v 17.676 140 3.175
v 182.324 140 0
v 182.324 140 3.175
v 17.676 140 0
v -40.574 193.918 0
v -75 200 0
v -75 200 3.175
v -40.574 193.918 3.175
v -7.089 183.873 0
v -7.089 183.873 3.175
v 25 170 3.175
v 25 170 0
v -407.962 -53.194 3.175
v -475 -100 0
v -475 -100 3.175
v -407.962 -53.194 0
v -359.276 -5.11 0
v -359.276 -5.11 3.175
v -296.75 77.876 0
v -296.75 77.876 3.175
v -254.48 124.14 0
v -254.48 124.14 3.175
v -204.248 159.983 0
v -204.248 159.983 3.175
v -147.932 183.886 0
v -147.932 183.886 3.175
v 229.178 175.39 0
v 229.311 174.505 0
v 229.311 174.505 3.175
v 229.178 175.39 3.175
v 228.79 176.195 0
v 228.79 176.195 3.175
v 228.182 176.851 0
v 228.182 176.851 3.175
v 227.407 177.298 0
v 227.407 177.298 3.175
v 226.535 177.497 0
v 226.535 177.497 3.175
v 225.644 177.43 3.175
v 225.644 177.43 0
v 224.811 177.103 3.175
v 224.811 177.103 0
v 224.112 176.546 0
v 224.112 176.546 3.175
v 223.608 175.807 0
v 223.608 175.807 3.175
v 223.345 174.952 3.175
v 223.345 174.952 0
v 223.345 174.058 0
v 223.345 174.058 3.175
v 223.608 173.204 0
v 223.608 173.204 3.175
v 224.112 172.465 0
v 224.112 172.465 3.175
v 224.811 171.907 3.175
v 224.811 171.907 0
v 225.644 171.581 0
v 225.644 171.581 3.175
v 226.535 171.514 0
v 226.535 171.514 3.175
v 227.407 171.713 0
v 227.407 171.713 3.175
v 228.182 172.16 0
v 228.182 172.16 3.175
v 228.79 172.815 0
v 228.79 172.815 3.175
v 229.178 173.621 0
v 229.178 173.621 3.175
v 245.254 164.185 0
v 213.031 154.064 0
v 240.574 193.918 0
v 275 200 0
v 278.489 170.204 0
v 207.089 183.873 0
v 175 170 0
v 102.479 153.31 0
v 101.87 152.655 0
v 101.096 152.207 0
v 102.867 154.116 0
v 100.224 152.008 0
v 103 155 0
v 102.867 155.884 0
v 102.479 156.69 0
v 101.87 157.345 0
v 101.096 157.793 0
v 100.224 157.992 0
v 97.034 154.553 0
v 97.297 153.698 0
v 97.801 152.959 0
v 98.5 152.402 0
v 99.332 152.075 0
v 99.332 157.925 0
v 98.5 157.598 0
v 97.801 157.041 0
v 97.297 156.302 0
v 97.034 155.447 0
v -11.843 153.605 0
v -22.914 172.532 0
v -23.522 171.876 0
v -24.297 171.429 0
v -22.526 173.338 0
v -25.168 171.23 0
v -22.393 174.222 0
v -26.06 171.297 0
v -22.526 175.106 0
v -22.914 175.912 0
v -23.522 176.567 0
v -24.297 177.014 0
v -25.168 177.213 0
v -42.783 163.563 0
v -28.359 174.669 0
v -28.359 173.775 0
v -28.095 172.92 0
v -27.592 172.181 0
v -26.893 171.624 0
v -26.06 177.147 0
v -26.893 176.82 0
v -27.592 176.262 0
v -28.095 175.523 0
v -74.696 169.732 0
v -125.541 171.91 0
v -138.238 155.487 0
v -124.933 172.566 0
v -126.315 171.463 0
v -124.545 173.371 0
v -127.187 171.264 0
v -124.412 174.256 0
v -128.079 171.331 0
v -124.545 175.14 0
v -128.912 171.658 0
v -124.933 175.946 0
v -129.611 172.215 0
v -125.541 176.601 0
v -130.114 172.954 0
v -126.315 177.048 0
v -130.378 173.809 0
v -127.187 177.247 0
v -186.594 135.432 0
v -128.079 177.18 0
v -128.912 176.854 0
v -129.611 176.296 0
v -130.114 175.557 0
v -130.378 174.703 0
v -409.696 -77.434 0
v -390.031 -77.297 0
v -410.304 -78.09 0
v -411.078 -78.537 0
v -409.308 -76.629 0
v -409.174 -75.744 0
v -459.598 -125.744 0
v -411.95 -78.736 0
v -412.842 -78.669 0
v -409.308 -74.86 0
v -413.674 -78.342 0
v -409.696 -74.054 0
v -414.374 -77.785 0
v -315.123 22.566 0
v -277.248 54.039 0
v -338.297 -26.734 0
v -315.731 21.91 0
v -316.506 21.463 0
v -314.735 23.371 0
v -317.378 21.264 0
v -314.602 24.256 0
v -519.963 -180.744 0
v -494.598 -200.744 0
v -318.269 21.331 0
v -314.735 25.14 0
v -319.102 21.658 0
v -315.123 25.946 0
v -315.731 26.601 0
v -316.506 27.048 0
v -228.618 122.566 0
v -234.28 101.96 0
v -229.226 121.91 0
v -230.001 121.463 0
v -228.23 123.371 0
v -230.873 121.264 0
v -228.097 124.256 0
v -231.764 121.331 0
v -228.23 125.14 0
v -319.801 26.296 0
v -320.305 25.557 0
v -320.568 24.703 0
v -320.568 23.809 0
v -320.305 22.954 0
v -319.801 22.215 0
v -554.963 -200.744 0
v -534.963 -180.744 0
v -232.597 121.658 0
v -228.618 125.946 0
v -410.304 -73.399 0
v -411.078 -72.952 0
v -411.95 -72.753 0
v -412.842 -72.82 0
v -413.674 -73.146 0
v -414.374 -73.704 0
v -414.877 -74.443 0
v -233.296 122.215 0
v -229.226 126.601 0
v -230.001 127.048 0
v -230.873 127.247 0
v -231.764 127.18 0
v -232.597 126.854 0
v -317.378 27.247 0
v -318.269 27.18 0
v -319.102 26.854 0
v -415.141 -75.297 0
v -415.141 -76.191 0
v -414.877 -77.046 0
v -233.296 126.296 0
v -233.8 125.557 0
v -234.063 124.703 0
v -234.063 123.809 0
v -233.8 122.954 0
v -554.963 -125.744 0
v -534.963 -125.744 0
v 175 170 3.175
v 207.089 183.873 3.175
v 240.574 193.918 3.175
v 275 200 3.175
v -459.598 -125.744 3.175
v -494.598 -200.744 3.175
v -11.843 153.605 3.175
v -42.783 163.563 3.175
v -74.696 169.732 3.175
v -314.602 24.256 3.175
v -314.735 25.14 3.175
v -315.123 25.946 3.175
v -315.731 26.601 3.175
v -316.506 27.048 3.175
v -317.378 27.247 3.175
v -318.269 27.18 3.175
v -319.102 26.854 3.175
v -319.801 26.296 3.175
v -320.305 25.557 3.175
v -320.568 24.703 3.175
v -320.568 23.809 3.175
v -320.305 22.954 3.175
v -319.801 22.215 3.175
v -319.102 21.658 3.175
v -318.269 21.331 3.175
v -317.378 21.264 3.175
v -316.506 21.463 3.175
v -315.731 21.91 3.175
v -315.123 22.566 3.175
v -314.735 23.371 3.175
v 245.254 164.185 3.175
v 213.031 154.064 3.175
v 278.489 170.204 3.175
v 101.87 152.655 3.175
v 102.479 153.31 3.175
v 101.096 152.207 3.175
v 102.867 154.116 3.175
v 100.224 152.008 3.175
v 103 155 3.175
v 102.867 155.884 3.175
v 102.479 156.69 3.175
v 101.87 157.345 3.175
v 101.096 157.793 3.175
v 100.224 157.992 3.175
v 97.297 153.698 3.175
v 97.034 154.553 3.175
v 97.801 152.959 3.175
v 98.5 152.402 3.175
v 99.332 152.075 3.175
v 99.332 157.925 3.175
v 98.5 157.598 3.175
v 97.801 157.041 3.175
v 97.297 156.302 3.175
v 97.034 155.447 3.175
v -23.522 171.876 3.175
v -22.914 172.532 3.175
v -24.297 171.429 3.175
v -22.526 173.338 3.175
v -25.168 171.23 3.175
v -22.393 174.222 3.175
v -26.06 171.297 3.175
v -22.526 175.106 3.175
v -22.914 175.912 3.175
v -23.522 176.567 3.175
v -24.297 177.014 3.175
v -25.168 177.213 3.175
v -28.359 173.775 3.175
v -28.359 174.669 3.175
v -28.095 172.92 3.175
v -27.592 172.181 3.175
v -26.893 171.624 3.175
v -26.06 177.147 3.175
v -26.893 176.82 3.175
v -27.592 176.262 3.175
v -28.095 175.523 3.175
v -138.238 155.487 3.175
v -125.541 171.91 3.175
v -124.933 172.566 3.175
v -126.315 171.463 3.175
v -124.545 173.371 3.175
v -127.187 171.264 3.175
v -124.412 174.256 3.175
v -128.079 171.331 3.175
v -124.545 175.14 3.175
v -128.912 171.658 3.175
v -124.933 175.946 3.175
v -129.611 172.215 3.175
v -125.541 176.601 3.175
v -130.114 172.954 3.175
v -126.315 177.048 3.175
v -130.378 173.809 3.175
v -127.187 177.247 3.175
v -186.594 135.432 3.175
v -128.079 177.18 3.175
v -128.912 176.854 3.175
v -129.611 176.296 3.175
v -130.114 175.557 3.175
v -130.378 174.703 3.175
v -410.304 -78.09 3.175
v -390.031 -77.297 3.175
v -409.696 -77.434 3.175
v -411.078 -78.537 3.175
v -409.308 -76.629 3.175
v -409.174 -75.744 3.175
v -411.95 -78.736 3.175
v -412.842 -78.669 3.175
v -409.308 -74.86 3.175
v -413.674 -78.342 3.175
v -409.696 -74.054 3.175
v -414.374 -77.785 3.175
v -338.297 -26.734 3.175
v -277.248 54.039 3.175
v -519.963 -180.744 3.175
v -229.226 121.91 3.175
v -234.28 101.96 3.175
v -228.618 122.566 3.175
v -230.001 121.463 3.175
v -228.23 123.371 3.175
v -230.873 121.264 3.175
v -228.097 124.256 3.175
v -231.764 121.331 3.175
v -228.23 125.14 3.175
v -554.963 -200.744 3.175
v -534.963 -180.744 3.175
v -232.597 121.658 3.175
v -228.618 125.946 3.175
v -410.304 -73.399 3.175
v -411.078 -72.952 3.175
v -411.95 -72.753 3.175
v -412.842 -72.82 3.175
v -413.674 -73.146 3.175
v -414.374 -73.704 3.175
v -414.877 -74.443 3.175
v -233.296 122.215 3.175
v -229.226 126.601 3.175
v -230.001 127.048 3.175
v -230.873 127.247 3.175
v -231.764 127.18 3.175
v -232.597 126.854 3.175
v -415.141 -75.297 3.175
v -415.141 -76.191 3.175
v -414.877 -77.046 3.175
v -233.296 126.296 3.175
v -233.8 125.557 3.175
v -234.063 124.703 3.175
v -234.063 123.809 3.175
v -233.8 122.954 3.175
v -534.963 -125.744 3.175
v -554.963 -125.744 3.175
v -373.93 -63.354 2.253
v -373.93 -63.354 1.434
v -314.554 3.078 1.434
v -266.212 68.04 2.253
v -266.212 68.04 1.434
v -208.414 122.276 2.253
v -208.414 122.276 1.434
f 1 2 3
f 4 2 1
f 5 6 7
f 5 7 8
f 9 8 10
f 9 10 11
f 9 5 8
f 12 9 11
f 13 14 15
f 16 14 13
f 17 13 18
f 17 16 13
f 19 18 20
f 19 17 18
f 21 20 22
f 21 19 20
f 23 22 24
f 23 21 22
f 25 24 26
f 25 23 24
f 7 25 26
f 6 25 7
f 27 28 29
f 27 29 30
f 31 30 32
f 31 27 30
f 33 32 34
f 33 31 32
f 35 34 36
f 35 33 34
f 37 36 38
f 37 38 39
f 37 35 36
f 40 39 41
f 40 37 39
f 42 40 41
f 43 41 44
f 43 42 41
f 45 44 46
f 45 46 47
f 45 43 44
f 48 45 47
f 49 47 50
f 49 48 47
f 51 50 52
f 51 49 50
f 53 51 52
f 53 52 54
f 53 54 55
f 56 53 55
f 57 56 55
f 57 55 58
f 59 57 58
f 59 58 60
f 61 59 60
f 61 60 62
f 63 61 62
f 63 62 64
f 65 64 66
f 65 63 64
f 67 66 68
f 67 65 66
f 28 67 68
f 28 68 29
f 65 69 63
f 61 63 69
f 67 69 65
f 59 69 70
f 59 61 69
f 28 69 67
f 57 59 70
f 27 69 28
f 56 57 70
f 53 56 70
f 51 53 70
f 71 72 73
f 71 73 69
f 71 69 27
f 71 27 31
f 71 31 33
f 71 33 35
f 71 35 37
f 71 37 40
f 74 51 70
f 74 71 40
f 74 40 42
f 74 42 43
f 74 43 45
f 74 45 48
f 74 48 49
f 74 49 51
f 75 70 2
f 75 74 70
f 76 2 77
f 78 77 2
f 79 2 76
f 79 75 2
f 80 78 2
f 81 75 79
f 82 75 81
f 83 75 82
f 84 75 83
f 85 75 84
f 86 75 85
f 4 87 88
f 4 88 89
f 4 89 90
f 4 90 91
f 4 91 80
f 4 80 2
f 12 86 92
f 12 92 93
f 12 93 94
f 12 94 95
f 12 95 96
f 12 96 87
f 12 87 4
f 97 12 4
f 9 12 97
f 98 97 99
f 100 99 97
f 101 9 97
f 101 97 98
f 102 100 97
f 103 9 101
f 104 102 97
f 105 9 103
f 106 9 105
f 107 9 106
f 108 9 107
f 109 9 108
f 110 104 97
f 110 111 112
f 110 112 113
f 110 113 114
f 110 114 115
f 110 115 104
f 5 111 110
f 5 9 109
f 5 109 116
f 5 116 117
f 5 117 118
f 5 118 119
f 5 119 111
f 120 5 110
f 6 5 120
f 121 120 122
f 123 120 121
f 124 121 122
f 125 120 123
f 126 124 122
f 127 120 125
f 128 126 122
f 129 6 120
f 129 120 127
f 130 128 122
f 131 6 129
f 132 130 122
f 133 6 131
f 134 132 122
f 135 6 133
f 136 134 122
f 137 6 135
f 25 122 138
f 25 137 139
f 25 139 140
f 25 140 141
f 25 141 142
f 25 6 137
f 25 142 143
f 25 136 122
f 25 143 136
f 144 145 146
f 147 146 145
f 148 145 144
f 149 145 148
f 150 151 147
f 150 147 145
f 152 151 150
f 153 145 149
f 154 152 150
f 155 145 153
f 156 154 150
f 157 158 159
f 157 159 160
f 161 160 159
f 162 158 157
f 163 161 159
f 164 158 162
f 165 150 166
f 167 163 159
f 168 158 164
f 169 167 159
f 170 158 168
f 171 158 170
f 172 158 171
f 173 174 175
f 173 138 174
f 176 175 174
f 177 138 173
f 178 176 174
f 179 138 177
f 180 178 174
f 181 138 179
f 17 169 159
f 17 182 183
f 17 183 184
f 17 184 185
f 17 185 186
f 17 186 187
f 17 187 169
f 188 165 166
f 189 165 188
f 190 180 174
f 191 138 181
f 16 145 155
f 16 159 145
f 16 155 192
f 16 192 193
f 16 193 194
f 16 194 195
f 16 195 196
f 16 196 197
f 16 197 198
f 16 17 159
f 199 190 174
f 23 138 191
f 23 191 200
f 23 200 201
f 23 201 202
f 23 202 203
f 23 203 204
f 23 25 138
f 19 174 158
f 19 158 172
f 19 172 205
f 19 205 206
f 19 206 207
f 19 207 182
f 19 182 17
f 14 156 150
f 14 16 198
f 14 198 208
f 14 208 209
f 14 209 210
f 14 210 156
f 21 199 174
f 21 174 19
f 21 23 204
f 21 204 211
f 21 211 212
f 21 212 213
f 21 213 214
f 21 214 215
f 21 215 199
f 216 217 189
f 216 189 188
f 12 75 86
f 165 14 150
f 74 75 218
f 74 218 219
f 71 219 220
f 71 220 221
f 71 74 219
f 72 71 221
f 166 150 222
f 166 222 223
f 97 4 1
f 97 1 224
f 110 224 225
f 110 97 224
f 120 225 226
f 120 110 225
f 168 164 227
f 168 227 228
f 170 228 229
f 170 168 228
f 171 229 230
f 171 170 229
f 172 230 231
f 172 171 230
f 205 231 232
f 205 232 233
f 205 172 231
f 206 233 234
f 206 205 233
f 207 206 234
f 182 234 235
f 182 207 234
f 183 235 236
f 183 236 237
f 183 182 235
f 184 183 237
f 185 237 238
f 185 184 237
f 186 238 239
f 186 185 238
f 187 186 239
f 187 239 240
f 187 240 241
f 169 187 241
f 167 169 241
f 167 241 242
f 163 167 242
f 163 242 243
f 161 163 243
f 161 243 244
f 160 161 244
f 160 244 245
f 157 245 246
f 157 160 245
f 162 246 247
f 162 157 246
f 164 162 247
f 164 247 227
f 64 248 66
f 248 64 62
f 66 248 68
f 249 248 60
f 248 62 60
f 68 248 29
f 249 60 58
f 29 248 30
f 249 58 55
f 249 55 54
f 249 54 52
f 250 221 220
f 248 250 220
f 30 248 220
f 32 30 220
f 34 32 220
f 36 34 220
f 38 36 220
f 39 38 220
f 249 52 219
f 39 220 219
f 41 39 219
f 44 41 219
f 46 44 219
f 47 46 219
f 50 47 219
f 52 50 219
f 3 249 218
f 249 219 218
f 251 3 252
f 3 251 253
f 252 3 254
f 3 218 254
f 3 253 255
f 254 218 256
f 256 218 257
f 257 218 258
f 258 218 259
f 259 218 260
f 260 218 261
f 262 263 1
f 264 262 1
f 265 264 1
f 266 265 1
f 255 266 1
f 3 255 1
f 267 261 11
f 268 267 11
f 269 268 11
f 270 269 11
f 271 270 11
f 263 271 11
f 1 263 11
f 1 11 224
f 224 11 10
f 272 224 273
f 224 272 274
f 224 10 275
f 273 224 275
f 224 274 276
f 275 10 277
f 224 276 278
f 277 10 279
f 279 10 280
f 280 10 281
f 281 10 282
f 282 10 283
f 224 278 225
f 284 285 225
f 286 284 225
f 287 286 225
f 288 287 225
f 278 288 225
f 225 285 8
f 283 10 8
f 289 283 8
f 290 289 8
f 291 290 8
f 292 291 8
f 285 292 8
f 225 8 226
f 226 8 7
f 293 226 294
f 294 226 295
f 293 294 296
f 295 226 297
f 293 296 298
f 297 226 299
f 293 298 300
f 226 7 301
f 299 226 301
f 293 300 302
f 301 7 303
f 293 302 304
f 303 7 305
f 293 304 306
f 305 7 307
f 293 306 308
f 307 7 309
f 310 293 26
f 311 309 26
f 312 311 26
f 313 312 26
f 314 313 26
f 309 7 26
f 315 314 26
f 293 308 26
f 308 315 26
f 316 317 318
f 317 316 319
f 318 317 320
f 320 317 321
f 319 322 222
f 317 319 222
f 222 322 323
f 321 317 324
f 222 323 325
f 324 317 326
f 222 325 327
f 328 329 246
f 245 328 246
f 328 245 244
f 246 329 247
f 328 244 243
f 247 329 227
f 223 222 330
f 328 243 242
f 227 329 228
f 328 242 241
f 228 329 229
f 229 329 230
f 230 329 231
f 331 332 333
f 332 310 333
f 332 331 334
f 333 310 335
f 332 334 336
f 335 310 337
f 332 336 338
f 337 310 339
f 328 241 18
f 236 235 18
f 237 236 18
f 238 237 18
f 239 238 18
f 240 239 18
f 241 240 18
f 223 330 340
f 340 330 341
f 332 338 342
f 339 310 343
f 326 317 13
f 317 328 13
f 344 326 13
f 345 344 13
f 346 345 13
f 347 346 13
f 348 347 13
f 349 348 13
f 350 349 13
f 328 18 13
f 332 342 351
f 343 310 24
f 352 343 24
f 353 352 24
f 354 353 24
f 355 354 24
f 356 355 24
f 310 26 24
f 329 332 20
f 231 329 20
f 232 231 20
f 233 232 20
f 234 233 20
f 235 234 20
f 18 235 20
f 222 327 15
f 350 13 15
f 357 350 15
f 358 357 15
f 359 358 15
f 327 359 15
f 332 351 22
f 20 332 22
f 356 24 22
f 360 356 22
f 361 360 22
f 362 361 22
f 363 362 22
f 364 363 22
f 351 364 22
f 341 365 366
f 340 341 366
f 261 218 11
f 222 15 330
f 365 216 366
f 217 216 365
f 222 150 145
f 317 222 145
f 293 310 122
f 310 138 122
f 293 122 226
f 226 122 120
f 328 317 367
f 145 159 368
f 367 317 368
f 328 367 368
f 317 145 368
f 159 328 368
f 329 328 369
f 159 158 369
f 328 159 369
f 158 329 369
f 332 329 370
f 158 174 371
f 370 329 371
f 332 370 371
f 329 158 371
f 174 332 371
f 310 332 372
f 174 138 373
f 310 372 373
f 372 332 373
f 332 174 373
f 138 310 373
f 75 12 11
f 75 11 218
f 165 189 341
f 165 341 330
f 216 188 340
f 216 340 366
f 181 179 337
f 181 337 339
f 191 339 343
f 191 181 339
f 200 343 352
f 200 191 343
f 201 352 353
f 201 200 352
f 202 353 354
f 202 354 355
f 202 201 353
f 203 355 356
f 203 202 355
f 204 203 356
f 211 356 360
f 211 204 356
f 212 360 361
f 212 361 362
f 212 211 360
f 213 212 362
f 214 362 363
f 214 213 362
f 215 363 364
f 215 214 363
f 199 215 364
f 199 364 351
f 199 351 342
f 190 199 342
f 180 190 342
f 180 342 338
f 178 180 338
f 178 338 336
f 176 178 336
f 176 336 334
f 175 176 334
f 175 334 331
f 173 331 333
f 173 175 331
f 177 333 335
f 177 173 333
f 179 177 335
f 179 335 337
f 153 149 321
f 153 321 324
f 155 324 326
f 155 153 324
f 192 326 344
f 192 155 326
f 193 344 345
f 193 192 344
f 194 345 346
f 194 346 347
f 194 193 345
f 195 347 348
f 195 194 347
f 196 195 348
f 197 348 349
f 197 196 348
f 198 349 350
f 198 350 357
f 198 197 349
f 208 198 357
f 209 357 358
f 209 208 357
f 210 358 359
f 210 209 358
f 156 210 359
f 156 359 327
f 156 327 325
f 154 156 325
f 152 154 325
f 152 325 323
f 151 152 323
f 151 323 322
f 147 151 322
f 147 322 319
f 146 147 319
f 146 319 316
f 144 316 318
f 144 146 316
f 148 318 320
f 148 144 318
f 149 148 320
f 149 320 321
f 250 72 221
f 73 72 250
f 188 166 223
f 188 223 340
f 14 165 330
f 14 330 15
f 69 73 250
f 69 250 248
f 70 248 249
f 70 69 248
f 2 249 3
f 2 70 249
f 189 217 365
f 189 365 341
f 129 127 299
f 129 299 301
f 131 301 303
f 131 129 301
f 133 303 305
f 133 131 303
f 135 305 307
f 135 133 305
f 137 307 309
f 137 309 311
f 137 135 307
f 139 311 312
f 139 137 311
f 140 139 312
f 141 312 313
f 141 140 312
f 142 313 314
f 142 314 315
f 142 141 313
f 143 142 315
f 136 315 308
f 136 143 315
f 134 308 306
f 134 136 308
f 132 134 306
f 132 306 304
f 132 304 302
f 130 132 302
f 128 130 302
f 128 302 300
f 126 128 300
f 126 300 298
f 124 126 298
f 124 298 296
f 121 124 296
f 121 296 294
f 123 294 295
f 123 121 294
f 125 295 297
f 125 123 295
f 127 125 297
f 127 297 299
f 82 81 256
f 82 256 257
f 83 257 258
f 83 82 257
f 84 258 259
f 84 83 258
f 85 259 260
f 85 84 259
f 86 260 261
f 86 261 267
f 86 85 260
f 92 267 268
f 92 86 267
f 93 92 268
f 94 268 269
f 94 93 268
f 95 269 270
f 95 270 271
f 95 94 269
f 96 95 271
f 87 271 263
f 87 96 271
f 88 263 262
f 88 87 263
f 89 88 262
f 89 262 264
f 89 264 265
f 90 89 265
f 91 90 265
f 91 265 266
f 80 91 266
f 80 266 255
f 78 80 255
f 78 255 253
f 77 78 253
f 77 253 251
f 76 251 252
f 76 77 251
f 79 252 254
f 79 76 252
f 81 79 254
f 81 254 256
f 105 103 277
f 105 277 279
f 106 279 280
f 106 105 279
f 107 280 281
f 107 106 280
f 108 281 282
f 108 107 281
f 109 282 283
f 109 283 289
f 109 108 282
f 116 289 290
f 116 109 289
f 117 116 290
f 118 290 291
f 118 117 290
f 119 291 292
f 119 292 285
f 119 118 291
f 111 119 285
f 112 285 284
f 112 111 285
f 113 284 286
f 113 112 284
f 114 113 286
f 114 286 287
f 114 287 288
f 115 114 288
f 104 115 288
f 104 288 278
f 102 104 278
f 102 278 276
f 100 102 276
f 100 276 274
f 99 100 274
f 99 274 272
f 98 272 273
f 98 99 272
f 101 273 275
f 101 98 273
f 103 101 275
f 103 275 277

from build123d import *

# Parameters (mm, degrees)
SKETCH1_R           = 3
BOSS_EXTRUDE1_DEPTH = 3.175


with BuildPart() as part:
    # Sketch1 → Boss-Extrude1 (new body)
    with BuildSketch(Plane.XY):
        with BuildLine():
            Line((25, 170), (175, 170))
            ThreePointArc((175, 170), (223.684930832, 189.383563894), (275, 200))
            Line((275, 200), (278.48892965, 170.203567833))
            ThreePointArc((278.48892965, 170.203567833), (228.984362684, 159.629140364), (182.323699215, 140))
            Line((182.323699215, 140), (17.676300785, 140))
            ThreePointArc((17.676300785, 140), (-27.163176857, 159.050053662), (-74.696057289, 169.732215313))
            add(Edge.make_bspline(
                [(-459.597813184, -125.74437106), (-458.167847661, -124.888859924), (-455.300989911, -123.160410804), (-449.693031194, -119.725805066), (-442.844497858, -115.430194443), (-434.897527213, -110.280573748), (-424.643042919, -103.410605598), (-412.446207366, -94.807407336), (-398.73286692, -84.425459971), (-385.875530014, -73.956655832), (-369.787206696, -59.850046206), (-355.152571956, -45.476802835), (-341.718077927, -30.784744771), (-332.160906415, -19.581186548), (-323.101555816, -8.241034683), (-311.630816912, 6.863649777), (-298.117522758, 25.605990916), (-282.395742384, 47.431562205), (-266.384320483, 68.25099024), (-249.34123977, 87.803395961), (-230.504956306, 105.928130356), (-212.601243201, 119.774018212), (-196.457396921, 130.048920131), (-183.303935629, 137.33205425), (-168.969219752, 144.162376514), (-153.317967868, 150.50005901), (-136.218766867, 156.296597686), (-120.658812709, 160.629761276), (-107.364076993, 163.767973943), (-96.958515184, 165.949209965), (-87.903435435, 167.618170459), (-80.445251901, 168.856738216), (-76.604810273, 169.448930821), (-74.696057289, 169.732215313)],
                knots=[0, 0, 0, 0, 0.007772041, 0.015544083, 0.031088165, 0.046632248, 0.06217633, 0.093264496, 0.124352661, 0.155440826, 0.186528991, 0.248705321, 0.279793487, 0.310881652, 0.341969817, 0.373057982, 0.435234312, 0.497410643, 0.559586973, 0.621763303, 0.683939634, 0.746115964, 0.777204129, 0.808292294, 0.83938046, 0.870468625, 0.90155679, 0.932644955, 0.948189038, 0.96373312, 0.979277203, 0.987049244, 0.994821285, 0.994821285, 0.994821285, 0.994821285], degree=3))
            Line((-459.597813184, -125.74437106), (-494.597813184, -200.74437106))
            Line((-494.597813184, -200.74437106), (-554.962766018, -200.74437106))
            Line((-554.962766018, -200.74437106), (-554.962766018, -125.74437106))
            Line((-554.962766018, -125.74437106), (-534.962766018, -125.74437106))
            Line((-534.962766018, -125.74437106), (-534.962766018, -180.74437106))
            Line((-534.962766018, -180.74437106), (-519.962766018, -180.74437106))
            Line((-519.962766018, -180.74437106), (-475, -100))
            add(Edge.make_bspline(
                [(-475, -100), (-419.540575809, -66.820070684), (-306.013905785, 34.036801702), (-257.635554762, 174.287094016), (-75, 200)],
                knots=[0, 0, 0, 0, 0.312223899, 1, 1, 1, 1], degree=3))
            ThreePointArc((-75, 200), (-23.684930832, 189.383563894), (25, 170))
        make_face()
        with Locations((-412.174499428, -75.74437106)):
            Circle(SKETCH1_R, mode=Mode.SUBTRACT)
        with Locations((-317.601811803, 24.25562894)):
            Circle(SKETCH1_R, mode=Mode.SUBTRACT)
        with Locations((-231.096695012, 124.25562894)):
            Circle(SKETCH1_R, mode=Mode.SUBTRACT)
        with Locations((-127.411512689, 174.25562894)):
            Circle(SKETCH1_R, mode=Mode.SUBTRACT)
        with Locations((100, 155)):
            Circle(SKETCH1_R, mode=Mode.SUBTRACT)
        with Locations((226.311251147, 174.505328628)):
            Circle(SKETCH1_R, mode=Mode.SUBTRACT)
        with Locations((-25.392583218, 174.221837866)):
            Circle(SKETCH1_R, mode=Mode.SUBTRACT)
    extrude(amount=BOSS_EXTRUDE1_DEPTH)


solid = part.part
